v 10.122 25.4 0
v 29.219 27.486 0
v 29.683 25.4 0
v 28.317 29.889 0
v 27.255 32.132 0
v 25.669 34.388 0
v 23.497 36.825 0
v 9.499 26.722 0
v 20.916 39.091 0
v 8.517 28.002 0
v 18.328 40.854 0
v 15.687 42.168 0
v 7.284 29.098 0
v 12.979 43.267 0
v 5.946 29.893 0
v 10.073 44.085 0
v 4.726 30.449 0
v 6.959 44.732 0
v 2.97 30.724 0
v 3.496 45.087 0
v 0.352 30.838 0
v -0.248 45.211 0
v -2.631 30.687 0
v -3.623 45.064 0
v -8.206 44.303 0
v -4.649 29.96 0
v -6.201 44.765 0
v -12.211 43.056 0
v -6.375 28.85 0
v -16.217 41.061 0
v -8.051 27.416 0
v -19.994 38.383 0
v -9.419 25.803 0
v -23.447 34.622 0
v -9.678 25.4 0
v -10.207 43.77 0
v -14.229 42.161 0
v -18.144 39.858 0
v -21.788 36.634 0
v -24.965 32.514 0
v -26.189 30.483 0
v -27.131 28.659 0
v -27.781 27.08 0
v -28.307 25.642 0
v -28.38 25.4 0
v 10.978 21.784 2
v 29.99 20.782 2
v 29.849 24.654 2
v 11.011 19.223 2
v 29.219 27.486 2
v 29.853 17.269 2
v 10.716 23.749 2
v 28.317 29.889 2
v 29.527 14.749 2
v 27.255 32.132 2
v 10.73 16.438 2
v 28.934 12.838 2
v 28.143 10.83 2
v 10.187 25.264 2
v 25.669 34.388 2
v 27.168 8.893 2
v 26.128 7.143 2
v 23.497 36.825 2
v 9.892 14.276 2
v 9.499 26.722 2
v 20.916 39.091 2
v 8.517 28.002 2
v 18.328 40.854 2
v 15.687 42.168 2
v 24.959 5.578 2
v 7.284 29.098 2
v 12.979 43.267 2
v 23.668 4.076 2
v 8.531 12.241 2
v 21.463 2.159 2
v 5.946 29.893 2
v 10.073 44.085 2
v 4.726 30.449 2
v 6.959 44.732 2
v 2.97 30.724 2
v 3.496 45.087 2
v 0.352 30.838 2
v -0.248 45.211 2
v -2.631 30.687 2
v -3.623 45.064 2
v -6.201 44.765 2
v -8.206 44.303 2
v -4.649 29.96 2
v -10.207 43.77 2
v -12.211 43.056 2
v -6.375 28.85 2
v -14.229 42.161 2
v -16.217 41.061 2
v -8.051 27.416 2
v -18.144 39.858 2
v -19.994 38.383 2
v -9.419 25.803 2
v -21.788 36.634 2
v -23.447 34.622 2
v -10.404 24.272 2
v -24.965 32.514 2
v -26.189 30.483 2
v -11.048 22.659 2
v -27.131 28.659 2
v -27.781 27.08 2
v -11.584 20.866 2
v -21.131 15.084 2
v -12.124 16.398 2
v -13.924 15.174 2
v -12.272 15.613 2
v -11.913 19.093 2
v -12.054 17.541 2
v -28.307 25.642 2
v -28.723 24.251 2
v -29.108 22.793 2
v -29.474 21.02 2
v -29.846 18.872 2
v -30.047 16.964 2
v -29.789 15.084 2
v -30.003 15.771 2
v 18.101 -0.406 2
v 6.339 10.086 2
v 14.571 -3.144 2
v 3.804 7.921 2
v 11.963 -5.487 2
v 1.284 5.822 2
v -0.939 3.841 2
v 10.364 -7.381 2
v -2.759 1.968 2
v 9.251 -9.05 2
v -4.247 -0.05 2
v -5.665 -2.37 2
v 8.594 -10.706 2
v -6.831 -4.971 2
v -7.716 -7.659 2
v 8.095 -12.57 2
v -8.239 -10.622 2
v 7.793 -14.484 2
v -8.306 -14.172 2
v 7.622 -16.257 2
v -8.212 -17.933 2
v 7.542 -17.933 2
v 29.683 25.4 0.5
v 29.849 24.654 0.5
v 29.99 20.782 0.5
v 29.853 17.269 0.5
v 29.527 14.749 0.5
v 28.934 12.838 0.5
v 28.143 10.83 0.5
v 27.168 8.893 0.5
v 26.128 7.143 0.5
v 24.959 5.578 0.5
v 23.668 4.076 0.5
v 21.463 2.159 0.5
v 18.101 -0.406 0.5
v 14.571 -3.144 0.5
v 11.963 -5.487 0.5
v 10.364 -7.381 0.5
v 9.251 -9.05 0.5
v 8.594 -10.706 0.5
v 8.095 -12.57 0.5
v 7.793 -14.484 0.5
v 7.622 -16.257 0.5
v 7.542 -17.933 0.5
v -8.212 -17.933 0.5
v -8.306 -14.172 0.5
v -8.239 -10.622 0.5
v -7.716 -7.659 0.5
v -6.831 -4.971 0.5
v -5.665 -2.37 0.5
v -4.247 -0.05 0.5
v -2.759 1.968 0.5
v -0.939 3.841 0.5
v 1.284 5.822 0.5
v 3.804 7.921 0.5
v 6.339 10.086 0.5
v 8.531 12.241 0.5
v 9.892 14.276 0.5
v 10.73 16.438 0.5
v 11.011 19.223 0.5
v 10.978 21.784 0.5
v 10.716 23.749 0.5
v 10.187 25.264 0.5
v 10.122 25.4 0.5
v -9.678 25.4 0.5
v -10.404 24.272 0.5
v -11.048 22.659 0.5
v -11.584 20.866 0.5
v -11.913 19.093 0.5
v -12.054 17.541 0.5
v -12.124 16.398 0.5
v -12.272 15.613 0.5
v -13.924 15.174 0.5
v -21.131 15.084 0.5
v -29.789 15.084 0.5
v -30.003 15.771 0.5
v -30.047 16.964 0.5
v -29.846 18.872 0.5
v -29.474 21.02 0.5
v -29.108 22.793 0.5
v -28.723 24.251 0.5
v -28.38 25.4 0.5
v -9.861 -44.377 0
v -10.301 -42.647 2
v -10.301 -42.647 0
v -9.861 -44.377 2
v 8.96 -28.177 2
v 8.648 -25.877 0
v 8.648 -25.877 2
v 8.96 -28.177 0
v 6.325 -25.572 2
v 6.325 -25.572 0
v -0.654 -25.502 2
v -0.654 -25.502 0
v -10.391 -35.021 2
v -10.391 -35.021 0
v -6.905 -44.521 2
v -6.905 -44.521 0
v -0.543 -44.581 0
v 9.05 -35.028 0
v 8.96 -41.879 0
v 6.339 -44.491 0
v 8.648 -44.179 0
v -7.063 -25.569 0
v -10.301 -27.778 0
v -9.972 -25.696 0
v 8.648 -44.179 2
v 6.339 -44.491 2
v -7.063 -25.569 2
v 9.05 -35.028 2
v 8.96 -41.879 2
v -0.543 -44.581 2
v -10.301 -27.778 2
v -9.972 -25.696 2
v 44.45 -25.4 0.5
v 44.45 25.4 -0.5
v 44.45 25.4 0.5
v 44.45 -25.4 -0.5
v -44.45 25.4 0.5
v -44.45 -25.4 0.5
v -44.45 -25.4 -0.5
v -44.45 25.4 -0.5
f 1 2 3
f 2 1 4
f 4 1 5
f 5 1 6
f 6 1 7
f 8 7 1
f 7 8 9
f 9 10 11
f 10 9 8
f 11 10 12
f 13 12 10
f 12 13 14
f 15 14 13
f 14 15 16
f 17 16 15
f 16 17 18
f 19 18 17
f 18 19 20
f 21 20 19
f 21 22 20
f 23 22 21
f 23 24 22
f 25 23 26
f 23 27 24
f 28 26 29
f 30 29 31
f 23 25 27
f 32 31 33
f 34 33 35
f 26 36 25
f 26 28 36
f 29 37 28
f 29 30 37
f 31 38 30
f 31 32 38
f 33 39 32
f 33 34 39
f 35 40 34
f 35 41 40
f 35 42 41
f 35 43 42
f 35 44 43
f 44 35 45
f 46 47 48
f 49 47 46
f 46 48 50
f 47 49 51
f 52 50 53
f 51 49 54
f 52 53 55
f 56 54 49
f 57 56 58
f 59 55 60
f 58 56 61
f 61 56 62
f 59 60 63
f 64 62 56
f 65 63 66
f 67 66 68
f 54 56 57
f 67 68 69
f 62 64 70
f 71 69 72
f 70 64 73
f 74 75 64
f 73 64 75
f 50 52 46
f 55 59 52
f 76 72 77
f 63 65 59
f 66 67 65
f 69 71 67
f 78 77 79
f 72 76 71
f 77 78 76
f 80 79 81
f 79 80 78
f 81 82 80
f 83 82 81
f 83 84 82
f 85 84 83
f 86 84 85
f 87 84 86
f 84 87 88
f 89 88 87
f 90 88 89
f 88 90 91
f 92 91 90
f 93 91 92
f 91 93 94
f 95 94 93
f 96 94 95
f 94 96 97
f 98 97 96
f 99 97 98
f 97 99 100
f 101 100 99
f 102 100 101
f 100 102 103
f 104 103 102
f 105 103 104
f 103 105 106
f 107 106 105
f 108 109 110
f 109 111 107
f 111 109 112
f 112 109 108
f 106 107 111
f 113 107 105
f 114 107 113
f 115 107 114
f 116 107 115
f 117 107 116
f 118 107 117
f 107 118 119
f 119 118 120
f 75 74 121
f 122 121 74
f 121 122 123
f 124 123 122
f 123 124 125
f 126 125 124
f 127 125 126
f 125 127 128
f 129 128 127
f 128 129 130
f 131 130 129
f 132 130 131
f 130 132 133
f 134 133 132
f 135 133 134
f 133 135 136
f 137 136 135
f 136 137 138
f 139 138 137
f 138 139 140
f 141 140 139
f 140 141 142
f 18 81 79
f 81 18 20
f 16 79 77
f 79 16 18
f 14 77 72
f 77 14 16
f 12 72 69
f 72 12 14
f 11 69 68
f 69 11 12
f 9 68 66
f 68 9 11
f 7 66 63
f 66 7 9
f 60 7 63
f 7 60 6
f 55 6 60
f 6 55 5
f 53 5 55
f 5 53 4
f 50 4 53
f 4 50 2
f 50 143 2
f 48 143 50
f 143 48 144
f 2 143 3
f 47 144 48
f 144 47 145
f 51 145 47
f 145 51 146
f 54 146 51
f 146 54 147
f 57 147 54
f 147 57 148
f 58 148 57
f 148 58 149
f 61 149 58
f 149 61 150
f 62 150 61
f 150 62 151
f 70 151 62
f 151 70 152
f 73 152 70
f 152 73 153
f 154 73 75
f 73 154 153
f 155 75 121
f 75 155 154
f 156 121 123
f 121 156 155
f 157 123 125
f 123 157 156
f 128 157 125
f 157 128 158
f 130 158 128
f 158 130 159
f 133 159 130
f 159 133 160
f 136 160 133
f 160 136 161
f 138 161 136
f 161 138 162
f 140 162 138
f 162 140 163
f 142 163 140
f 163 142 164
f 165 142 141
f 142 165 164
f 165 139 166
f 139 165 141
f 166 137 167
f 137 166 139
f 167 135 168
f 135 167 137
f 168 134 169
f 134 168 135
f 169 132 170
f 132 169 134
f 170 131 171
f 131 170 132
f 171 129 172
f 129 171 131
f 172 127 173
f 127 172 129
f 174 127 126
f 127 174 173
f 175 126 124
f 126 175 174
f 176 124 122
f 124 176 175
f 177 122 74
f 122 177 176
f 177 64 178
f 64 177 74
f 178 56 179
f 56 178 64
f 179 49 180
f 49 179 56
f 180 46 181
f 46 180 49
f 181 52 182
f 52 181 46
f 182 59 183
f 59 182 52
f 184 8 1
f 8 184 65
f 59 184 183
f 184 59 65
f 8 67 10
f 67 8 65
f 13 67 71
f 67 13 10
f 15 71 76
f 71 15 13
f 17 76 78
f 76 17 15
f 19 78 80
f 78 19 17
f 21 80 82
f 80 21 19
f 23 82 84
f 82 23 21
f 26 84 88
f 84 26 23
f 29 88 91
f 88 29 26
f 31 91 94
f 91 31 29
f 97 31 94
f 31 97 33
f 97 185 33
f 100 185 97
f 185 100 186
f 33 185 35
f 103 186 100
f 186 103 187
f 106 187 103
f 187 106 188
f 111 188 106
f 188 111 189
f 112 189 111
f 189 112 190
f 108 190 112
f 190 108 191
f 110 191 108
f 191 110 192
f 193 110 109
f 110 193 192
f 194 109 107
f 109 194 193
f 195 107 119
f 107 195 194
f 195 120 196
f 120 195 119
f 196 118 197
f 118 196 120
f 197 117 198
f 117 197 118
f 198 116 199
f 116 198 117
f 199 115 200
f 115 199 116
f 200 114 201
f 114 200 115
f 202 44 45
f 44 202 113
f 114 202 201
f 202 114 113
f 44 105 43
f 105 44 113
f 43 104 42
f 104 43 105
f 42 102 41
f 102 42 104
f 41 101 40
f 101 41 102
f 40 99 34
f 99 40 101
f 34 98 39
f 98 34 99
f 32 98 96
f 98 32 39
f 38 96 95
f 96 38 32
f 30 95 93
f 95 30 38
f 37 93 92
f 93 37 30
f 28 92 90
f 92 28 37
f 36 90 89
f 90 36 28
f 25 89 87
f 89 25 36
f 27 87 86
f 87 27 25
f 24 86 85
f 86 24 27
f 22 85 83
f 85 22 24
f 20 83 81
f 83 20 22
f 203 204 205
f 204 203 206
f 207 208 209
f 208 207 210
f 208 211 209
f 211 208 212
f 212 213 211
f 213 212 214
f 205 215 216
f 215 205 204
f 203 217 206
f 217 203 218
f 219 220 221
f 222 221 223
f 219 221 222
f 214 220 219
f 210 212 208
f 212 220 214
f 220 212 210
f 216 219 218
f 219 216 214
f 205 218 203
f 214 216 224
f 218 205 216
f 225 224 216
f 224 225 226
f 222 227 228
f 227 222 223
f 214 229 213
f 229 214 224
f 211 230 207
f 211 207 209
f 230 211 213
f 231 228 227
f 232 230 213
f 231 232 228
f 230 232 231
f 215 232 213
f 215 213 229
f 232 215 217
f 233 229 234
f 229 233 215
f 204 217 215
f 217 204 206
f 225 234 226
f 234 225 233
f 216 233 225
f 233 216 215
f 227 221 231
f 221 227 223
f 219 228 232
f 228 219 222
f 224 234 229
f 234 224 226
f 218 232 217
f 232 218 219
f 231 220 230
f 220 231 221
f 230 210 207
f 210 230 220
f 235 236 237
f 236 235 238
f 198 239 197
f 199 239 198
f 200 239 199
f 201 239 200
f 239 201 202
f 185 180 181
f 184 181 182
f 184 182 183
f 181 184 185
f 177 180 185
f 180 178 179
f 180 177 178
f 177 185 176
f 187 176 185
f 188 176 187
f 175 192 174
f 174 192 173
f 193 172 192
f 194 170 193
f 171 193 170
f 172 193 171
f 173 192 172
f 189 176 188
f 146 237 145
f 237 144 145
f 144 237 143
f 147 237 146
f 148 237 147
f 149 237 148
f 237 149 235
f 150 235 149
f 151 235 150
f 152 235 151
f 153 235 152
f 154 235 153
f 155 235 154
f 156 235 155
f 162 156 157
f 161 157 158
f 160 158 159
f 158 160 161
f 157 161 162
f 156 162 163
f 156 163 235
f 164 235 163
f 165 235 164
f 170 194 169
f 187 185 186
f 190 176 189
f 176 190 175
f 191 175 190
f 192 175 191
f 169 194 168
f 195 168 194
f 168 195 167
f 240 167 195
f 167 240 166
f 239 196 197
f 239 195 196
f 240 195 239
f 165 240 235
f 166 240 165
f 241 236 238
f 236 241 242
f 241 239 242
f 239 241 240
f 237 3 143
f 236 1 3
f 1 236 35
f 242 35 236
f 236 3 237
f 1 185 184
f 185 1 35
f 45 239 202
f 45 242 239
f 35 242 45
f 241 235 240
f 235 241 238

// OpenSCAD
//------------------------------------------------------------
//	
//
//	input comes from:
//	http://chaaawa.com/stencil_factory/
//
//	
//	http://www.thingiverse.com/thing:55821
//------------------------------------------------------------

// preview[view:south, tilt:top]

// Go to: http://chaaawa.com/stencil_factory/, then paste here after "Convert&Copy".
input ="no_input";

stencil_thickness = 1;
stencil_width = 80;
margin = 10;

//If you don't want to center your design on the case
offX = 0;
offY = 0;
image_rotation =0; //[-180:180]

module void() {}

dispo_width = stencil_width - 2*margin;

points_array = (input=="no_input"? [[179,268],[[199.26,15.12],[189.19,15.56],[181.5,16.45],[175.52,17.83],[169.55,19.42],[163.57,21.55],[157.55,24.22],[151.62,27.5],[145.87,31.09],[140.35,35.49],[135,40.71],[130.05,46.71],[125.52,53],[121.87,59.06],[119.06,64.5],[117.12,69.21],[115.55,73.5],[114.31,77.65],[113.16,82],[112.07,87.29],[110.96,93.7],[110.36,99.39],[110.49,102.95],[111.13,105],[136.96,105],[158.46,104.73],[163.39,103.42],[163.83,101.08],[164.04,97.67],[164.46,93.04],[165.44,87.75],[167.04,82.4],[168.96,77.59],[171.9,73.02],[175.98,68.21],[180.98,63.93],[186.13,60.62],[192.15,58.45],[201.05,58],[208.86,58.34],[214.1,59.16],[217.74,60.82],[221.73,63.19],[225.41,66.46],[228.34,70.28],[230.39,74.63],[231.97,79.15],[232.75,85.01],[232.85,92.65],[232.01,100.96],[229.51,107.41],[225.45,113.48],[218.91,119.91],[211.35,126.37],[203.83,132.63],[197.2,138.54],[191.77,144.13],[187.33,150.15],[183.1,157.07],[179.62,164.83],[176.98,172.85],[175.42,181.69],[175.22,192.28],[175.5,203.5],[199,203.5],[222.5,203.5],[222.74,198.5],[223.25,193.21],[224.15,187.5],[225.64,181.94],[227.6,177],[230.92,172.02],[235.69,166.37],[243.47,159.38],[254,151.21],[264.03,143.56],[270.61,137.84],[274.46,133.36],[277.95,128.69],[281.05,123.47],[283.96,117.69],[286.32,111.7],[288.09,106],[289.06,98.48],[289.47,88],[289.05,76.45],[287.17,68],[284.48,60.83],[281.31,54.14],[276.58,47.41],[270.1,40.14],[262.4,33.38],[254.68,28.12],[246.8,24.2],[238.72,20.92],[230.05,18.48],[220.76,16.55],[210.43,15.49],[199.26,15.12]],[[198.05,226.08],[178.93,226.28],[170.25,226.66],[169.27,232.87],[169,254.48],[169.27,277.23],[170.58,282.39],[179.4,282.82],[198.38,283],[218.91,282.73],[225.8,281.8],[226.73,274.94],[227,254.5],[226.73,234.06],[225.8,227.2],[218.87,226.29],[198.05,226.08]]]: input);

input_width = points_array[0][0];
input_height= points_array[0][1];
sTrace = dispo_width/input_width;
stencil_height = input_height*sTrace + 2*margin;

cube([88.9,50.8,1], center=true);

difference() {
	translate([0, 0, stencil_thickness/2])
	translate([offX, offY, -stencil_thickness/2])
	rotate([0,0,image_rotation])
	scale([sTrace, -sTrace, 1])
	translate([-200, -150, 0]) {
		union() {
			for (i = [1:len(points_array) -1] ) {
				linear_extrude(height=stencil_thickness*2) {polygon(points_array[i]);}
			}
		}
	}
}
